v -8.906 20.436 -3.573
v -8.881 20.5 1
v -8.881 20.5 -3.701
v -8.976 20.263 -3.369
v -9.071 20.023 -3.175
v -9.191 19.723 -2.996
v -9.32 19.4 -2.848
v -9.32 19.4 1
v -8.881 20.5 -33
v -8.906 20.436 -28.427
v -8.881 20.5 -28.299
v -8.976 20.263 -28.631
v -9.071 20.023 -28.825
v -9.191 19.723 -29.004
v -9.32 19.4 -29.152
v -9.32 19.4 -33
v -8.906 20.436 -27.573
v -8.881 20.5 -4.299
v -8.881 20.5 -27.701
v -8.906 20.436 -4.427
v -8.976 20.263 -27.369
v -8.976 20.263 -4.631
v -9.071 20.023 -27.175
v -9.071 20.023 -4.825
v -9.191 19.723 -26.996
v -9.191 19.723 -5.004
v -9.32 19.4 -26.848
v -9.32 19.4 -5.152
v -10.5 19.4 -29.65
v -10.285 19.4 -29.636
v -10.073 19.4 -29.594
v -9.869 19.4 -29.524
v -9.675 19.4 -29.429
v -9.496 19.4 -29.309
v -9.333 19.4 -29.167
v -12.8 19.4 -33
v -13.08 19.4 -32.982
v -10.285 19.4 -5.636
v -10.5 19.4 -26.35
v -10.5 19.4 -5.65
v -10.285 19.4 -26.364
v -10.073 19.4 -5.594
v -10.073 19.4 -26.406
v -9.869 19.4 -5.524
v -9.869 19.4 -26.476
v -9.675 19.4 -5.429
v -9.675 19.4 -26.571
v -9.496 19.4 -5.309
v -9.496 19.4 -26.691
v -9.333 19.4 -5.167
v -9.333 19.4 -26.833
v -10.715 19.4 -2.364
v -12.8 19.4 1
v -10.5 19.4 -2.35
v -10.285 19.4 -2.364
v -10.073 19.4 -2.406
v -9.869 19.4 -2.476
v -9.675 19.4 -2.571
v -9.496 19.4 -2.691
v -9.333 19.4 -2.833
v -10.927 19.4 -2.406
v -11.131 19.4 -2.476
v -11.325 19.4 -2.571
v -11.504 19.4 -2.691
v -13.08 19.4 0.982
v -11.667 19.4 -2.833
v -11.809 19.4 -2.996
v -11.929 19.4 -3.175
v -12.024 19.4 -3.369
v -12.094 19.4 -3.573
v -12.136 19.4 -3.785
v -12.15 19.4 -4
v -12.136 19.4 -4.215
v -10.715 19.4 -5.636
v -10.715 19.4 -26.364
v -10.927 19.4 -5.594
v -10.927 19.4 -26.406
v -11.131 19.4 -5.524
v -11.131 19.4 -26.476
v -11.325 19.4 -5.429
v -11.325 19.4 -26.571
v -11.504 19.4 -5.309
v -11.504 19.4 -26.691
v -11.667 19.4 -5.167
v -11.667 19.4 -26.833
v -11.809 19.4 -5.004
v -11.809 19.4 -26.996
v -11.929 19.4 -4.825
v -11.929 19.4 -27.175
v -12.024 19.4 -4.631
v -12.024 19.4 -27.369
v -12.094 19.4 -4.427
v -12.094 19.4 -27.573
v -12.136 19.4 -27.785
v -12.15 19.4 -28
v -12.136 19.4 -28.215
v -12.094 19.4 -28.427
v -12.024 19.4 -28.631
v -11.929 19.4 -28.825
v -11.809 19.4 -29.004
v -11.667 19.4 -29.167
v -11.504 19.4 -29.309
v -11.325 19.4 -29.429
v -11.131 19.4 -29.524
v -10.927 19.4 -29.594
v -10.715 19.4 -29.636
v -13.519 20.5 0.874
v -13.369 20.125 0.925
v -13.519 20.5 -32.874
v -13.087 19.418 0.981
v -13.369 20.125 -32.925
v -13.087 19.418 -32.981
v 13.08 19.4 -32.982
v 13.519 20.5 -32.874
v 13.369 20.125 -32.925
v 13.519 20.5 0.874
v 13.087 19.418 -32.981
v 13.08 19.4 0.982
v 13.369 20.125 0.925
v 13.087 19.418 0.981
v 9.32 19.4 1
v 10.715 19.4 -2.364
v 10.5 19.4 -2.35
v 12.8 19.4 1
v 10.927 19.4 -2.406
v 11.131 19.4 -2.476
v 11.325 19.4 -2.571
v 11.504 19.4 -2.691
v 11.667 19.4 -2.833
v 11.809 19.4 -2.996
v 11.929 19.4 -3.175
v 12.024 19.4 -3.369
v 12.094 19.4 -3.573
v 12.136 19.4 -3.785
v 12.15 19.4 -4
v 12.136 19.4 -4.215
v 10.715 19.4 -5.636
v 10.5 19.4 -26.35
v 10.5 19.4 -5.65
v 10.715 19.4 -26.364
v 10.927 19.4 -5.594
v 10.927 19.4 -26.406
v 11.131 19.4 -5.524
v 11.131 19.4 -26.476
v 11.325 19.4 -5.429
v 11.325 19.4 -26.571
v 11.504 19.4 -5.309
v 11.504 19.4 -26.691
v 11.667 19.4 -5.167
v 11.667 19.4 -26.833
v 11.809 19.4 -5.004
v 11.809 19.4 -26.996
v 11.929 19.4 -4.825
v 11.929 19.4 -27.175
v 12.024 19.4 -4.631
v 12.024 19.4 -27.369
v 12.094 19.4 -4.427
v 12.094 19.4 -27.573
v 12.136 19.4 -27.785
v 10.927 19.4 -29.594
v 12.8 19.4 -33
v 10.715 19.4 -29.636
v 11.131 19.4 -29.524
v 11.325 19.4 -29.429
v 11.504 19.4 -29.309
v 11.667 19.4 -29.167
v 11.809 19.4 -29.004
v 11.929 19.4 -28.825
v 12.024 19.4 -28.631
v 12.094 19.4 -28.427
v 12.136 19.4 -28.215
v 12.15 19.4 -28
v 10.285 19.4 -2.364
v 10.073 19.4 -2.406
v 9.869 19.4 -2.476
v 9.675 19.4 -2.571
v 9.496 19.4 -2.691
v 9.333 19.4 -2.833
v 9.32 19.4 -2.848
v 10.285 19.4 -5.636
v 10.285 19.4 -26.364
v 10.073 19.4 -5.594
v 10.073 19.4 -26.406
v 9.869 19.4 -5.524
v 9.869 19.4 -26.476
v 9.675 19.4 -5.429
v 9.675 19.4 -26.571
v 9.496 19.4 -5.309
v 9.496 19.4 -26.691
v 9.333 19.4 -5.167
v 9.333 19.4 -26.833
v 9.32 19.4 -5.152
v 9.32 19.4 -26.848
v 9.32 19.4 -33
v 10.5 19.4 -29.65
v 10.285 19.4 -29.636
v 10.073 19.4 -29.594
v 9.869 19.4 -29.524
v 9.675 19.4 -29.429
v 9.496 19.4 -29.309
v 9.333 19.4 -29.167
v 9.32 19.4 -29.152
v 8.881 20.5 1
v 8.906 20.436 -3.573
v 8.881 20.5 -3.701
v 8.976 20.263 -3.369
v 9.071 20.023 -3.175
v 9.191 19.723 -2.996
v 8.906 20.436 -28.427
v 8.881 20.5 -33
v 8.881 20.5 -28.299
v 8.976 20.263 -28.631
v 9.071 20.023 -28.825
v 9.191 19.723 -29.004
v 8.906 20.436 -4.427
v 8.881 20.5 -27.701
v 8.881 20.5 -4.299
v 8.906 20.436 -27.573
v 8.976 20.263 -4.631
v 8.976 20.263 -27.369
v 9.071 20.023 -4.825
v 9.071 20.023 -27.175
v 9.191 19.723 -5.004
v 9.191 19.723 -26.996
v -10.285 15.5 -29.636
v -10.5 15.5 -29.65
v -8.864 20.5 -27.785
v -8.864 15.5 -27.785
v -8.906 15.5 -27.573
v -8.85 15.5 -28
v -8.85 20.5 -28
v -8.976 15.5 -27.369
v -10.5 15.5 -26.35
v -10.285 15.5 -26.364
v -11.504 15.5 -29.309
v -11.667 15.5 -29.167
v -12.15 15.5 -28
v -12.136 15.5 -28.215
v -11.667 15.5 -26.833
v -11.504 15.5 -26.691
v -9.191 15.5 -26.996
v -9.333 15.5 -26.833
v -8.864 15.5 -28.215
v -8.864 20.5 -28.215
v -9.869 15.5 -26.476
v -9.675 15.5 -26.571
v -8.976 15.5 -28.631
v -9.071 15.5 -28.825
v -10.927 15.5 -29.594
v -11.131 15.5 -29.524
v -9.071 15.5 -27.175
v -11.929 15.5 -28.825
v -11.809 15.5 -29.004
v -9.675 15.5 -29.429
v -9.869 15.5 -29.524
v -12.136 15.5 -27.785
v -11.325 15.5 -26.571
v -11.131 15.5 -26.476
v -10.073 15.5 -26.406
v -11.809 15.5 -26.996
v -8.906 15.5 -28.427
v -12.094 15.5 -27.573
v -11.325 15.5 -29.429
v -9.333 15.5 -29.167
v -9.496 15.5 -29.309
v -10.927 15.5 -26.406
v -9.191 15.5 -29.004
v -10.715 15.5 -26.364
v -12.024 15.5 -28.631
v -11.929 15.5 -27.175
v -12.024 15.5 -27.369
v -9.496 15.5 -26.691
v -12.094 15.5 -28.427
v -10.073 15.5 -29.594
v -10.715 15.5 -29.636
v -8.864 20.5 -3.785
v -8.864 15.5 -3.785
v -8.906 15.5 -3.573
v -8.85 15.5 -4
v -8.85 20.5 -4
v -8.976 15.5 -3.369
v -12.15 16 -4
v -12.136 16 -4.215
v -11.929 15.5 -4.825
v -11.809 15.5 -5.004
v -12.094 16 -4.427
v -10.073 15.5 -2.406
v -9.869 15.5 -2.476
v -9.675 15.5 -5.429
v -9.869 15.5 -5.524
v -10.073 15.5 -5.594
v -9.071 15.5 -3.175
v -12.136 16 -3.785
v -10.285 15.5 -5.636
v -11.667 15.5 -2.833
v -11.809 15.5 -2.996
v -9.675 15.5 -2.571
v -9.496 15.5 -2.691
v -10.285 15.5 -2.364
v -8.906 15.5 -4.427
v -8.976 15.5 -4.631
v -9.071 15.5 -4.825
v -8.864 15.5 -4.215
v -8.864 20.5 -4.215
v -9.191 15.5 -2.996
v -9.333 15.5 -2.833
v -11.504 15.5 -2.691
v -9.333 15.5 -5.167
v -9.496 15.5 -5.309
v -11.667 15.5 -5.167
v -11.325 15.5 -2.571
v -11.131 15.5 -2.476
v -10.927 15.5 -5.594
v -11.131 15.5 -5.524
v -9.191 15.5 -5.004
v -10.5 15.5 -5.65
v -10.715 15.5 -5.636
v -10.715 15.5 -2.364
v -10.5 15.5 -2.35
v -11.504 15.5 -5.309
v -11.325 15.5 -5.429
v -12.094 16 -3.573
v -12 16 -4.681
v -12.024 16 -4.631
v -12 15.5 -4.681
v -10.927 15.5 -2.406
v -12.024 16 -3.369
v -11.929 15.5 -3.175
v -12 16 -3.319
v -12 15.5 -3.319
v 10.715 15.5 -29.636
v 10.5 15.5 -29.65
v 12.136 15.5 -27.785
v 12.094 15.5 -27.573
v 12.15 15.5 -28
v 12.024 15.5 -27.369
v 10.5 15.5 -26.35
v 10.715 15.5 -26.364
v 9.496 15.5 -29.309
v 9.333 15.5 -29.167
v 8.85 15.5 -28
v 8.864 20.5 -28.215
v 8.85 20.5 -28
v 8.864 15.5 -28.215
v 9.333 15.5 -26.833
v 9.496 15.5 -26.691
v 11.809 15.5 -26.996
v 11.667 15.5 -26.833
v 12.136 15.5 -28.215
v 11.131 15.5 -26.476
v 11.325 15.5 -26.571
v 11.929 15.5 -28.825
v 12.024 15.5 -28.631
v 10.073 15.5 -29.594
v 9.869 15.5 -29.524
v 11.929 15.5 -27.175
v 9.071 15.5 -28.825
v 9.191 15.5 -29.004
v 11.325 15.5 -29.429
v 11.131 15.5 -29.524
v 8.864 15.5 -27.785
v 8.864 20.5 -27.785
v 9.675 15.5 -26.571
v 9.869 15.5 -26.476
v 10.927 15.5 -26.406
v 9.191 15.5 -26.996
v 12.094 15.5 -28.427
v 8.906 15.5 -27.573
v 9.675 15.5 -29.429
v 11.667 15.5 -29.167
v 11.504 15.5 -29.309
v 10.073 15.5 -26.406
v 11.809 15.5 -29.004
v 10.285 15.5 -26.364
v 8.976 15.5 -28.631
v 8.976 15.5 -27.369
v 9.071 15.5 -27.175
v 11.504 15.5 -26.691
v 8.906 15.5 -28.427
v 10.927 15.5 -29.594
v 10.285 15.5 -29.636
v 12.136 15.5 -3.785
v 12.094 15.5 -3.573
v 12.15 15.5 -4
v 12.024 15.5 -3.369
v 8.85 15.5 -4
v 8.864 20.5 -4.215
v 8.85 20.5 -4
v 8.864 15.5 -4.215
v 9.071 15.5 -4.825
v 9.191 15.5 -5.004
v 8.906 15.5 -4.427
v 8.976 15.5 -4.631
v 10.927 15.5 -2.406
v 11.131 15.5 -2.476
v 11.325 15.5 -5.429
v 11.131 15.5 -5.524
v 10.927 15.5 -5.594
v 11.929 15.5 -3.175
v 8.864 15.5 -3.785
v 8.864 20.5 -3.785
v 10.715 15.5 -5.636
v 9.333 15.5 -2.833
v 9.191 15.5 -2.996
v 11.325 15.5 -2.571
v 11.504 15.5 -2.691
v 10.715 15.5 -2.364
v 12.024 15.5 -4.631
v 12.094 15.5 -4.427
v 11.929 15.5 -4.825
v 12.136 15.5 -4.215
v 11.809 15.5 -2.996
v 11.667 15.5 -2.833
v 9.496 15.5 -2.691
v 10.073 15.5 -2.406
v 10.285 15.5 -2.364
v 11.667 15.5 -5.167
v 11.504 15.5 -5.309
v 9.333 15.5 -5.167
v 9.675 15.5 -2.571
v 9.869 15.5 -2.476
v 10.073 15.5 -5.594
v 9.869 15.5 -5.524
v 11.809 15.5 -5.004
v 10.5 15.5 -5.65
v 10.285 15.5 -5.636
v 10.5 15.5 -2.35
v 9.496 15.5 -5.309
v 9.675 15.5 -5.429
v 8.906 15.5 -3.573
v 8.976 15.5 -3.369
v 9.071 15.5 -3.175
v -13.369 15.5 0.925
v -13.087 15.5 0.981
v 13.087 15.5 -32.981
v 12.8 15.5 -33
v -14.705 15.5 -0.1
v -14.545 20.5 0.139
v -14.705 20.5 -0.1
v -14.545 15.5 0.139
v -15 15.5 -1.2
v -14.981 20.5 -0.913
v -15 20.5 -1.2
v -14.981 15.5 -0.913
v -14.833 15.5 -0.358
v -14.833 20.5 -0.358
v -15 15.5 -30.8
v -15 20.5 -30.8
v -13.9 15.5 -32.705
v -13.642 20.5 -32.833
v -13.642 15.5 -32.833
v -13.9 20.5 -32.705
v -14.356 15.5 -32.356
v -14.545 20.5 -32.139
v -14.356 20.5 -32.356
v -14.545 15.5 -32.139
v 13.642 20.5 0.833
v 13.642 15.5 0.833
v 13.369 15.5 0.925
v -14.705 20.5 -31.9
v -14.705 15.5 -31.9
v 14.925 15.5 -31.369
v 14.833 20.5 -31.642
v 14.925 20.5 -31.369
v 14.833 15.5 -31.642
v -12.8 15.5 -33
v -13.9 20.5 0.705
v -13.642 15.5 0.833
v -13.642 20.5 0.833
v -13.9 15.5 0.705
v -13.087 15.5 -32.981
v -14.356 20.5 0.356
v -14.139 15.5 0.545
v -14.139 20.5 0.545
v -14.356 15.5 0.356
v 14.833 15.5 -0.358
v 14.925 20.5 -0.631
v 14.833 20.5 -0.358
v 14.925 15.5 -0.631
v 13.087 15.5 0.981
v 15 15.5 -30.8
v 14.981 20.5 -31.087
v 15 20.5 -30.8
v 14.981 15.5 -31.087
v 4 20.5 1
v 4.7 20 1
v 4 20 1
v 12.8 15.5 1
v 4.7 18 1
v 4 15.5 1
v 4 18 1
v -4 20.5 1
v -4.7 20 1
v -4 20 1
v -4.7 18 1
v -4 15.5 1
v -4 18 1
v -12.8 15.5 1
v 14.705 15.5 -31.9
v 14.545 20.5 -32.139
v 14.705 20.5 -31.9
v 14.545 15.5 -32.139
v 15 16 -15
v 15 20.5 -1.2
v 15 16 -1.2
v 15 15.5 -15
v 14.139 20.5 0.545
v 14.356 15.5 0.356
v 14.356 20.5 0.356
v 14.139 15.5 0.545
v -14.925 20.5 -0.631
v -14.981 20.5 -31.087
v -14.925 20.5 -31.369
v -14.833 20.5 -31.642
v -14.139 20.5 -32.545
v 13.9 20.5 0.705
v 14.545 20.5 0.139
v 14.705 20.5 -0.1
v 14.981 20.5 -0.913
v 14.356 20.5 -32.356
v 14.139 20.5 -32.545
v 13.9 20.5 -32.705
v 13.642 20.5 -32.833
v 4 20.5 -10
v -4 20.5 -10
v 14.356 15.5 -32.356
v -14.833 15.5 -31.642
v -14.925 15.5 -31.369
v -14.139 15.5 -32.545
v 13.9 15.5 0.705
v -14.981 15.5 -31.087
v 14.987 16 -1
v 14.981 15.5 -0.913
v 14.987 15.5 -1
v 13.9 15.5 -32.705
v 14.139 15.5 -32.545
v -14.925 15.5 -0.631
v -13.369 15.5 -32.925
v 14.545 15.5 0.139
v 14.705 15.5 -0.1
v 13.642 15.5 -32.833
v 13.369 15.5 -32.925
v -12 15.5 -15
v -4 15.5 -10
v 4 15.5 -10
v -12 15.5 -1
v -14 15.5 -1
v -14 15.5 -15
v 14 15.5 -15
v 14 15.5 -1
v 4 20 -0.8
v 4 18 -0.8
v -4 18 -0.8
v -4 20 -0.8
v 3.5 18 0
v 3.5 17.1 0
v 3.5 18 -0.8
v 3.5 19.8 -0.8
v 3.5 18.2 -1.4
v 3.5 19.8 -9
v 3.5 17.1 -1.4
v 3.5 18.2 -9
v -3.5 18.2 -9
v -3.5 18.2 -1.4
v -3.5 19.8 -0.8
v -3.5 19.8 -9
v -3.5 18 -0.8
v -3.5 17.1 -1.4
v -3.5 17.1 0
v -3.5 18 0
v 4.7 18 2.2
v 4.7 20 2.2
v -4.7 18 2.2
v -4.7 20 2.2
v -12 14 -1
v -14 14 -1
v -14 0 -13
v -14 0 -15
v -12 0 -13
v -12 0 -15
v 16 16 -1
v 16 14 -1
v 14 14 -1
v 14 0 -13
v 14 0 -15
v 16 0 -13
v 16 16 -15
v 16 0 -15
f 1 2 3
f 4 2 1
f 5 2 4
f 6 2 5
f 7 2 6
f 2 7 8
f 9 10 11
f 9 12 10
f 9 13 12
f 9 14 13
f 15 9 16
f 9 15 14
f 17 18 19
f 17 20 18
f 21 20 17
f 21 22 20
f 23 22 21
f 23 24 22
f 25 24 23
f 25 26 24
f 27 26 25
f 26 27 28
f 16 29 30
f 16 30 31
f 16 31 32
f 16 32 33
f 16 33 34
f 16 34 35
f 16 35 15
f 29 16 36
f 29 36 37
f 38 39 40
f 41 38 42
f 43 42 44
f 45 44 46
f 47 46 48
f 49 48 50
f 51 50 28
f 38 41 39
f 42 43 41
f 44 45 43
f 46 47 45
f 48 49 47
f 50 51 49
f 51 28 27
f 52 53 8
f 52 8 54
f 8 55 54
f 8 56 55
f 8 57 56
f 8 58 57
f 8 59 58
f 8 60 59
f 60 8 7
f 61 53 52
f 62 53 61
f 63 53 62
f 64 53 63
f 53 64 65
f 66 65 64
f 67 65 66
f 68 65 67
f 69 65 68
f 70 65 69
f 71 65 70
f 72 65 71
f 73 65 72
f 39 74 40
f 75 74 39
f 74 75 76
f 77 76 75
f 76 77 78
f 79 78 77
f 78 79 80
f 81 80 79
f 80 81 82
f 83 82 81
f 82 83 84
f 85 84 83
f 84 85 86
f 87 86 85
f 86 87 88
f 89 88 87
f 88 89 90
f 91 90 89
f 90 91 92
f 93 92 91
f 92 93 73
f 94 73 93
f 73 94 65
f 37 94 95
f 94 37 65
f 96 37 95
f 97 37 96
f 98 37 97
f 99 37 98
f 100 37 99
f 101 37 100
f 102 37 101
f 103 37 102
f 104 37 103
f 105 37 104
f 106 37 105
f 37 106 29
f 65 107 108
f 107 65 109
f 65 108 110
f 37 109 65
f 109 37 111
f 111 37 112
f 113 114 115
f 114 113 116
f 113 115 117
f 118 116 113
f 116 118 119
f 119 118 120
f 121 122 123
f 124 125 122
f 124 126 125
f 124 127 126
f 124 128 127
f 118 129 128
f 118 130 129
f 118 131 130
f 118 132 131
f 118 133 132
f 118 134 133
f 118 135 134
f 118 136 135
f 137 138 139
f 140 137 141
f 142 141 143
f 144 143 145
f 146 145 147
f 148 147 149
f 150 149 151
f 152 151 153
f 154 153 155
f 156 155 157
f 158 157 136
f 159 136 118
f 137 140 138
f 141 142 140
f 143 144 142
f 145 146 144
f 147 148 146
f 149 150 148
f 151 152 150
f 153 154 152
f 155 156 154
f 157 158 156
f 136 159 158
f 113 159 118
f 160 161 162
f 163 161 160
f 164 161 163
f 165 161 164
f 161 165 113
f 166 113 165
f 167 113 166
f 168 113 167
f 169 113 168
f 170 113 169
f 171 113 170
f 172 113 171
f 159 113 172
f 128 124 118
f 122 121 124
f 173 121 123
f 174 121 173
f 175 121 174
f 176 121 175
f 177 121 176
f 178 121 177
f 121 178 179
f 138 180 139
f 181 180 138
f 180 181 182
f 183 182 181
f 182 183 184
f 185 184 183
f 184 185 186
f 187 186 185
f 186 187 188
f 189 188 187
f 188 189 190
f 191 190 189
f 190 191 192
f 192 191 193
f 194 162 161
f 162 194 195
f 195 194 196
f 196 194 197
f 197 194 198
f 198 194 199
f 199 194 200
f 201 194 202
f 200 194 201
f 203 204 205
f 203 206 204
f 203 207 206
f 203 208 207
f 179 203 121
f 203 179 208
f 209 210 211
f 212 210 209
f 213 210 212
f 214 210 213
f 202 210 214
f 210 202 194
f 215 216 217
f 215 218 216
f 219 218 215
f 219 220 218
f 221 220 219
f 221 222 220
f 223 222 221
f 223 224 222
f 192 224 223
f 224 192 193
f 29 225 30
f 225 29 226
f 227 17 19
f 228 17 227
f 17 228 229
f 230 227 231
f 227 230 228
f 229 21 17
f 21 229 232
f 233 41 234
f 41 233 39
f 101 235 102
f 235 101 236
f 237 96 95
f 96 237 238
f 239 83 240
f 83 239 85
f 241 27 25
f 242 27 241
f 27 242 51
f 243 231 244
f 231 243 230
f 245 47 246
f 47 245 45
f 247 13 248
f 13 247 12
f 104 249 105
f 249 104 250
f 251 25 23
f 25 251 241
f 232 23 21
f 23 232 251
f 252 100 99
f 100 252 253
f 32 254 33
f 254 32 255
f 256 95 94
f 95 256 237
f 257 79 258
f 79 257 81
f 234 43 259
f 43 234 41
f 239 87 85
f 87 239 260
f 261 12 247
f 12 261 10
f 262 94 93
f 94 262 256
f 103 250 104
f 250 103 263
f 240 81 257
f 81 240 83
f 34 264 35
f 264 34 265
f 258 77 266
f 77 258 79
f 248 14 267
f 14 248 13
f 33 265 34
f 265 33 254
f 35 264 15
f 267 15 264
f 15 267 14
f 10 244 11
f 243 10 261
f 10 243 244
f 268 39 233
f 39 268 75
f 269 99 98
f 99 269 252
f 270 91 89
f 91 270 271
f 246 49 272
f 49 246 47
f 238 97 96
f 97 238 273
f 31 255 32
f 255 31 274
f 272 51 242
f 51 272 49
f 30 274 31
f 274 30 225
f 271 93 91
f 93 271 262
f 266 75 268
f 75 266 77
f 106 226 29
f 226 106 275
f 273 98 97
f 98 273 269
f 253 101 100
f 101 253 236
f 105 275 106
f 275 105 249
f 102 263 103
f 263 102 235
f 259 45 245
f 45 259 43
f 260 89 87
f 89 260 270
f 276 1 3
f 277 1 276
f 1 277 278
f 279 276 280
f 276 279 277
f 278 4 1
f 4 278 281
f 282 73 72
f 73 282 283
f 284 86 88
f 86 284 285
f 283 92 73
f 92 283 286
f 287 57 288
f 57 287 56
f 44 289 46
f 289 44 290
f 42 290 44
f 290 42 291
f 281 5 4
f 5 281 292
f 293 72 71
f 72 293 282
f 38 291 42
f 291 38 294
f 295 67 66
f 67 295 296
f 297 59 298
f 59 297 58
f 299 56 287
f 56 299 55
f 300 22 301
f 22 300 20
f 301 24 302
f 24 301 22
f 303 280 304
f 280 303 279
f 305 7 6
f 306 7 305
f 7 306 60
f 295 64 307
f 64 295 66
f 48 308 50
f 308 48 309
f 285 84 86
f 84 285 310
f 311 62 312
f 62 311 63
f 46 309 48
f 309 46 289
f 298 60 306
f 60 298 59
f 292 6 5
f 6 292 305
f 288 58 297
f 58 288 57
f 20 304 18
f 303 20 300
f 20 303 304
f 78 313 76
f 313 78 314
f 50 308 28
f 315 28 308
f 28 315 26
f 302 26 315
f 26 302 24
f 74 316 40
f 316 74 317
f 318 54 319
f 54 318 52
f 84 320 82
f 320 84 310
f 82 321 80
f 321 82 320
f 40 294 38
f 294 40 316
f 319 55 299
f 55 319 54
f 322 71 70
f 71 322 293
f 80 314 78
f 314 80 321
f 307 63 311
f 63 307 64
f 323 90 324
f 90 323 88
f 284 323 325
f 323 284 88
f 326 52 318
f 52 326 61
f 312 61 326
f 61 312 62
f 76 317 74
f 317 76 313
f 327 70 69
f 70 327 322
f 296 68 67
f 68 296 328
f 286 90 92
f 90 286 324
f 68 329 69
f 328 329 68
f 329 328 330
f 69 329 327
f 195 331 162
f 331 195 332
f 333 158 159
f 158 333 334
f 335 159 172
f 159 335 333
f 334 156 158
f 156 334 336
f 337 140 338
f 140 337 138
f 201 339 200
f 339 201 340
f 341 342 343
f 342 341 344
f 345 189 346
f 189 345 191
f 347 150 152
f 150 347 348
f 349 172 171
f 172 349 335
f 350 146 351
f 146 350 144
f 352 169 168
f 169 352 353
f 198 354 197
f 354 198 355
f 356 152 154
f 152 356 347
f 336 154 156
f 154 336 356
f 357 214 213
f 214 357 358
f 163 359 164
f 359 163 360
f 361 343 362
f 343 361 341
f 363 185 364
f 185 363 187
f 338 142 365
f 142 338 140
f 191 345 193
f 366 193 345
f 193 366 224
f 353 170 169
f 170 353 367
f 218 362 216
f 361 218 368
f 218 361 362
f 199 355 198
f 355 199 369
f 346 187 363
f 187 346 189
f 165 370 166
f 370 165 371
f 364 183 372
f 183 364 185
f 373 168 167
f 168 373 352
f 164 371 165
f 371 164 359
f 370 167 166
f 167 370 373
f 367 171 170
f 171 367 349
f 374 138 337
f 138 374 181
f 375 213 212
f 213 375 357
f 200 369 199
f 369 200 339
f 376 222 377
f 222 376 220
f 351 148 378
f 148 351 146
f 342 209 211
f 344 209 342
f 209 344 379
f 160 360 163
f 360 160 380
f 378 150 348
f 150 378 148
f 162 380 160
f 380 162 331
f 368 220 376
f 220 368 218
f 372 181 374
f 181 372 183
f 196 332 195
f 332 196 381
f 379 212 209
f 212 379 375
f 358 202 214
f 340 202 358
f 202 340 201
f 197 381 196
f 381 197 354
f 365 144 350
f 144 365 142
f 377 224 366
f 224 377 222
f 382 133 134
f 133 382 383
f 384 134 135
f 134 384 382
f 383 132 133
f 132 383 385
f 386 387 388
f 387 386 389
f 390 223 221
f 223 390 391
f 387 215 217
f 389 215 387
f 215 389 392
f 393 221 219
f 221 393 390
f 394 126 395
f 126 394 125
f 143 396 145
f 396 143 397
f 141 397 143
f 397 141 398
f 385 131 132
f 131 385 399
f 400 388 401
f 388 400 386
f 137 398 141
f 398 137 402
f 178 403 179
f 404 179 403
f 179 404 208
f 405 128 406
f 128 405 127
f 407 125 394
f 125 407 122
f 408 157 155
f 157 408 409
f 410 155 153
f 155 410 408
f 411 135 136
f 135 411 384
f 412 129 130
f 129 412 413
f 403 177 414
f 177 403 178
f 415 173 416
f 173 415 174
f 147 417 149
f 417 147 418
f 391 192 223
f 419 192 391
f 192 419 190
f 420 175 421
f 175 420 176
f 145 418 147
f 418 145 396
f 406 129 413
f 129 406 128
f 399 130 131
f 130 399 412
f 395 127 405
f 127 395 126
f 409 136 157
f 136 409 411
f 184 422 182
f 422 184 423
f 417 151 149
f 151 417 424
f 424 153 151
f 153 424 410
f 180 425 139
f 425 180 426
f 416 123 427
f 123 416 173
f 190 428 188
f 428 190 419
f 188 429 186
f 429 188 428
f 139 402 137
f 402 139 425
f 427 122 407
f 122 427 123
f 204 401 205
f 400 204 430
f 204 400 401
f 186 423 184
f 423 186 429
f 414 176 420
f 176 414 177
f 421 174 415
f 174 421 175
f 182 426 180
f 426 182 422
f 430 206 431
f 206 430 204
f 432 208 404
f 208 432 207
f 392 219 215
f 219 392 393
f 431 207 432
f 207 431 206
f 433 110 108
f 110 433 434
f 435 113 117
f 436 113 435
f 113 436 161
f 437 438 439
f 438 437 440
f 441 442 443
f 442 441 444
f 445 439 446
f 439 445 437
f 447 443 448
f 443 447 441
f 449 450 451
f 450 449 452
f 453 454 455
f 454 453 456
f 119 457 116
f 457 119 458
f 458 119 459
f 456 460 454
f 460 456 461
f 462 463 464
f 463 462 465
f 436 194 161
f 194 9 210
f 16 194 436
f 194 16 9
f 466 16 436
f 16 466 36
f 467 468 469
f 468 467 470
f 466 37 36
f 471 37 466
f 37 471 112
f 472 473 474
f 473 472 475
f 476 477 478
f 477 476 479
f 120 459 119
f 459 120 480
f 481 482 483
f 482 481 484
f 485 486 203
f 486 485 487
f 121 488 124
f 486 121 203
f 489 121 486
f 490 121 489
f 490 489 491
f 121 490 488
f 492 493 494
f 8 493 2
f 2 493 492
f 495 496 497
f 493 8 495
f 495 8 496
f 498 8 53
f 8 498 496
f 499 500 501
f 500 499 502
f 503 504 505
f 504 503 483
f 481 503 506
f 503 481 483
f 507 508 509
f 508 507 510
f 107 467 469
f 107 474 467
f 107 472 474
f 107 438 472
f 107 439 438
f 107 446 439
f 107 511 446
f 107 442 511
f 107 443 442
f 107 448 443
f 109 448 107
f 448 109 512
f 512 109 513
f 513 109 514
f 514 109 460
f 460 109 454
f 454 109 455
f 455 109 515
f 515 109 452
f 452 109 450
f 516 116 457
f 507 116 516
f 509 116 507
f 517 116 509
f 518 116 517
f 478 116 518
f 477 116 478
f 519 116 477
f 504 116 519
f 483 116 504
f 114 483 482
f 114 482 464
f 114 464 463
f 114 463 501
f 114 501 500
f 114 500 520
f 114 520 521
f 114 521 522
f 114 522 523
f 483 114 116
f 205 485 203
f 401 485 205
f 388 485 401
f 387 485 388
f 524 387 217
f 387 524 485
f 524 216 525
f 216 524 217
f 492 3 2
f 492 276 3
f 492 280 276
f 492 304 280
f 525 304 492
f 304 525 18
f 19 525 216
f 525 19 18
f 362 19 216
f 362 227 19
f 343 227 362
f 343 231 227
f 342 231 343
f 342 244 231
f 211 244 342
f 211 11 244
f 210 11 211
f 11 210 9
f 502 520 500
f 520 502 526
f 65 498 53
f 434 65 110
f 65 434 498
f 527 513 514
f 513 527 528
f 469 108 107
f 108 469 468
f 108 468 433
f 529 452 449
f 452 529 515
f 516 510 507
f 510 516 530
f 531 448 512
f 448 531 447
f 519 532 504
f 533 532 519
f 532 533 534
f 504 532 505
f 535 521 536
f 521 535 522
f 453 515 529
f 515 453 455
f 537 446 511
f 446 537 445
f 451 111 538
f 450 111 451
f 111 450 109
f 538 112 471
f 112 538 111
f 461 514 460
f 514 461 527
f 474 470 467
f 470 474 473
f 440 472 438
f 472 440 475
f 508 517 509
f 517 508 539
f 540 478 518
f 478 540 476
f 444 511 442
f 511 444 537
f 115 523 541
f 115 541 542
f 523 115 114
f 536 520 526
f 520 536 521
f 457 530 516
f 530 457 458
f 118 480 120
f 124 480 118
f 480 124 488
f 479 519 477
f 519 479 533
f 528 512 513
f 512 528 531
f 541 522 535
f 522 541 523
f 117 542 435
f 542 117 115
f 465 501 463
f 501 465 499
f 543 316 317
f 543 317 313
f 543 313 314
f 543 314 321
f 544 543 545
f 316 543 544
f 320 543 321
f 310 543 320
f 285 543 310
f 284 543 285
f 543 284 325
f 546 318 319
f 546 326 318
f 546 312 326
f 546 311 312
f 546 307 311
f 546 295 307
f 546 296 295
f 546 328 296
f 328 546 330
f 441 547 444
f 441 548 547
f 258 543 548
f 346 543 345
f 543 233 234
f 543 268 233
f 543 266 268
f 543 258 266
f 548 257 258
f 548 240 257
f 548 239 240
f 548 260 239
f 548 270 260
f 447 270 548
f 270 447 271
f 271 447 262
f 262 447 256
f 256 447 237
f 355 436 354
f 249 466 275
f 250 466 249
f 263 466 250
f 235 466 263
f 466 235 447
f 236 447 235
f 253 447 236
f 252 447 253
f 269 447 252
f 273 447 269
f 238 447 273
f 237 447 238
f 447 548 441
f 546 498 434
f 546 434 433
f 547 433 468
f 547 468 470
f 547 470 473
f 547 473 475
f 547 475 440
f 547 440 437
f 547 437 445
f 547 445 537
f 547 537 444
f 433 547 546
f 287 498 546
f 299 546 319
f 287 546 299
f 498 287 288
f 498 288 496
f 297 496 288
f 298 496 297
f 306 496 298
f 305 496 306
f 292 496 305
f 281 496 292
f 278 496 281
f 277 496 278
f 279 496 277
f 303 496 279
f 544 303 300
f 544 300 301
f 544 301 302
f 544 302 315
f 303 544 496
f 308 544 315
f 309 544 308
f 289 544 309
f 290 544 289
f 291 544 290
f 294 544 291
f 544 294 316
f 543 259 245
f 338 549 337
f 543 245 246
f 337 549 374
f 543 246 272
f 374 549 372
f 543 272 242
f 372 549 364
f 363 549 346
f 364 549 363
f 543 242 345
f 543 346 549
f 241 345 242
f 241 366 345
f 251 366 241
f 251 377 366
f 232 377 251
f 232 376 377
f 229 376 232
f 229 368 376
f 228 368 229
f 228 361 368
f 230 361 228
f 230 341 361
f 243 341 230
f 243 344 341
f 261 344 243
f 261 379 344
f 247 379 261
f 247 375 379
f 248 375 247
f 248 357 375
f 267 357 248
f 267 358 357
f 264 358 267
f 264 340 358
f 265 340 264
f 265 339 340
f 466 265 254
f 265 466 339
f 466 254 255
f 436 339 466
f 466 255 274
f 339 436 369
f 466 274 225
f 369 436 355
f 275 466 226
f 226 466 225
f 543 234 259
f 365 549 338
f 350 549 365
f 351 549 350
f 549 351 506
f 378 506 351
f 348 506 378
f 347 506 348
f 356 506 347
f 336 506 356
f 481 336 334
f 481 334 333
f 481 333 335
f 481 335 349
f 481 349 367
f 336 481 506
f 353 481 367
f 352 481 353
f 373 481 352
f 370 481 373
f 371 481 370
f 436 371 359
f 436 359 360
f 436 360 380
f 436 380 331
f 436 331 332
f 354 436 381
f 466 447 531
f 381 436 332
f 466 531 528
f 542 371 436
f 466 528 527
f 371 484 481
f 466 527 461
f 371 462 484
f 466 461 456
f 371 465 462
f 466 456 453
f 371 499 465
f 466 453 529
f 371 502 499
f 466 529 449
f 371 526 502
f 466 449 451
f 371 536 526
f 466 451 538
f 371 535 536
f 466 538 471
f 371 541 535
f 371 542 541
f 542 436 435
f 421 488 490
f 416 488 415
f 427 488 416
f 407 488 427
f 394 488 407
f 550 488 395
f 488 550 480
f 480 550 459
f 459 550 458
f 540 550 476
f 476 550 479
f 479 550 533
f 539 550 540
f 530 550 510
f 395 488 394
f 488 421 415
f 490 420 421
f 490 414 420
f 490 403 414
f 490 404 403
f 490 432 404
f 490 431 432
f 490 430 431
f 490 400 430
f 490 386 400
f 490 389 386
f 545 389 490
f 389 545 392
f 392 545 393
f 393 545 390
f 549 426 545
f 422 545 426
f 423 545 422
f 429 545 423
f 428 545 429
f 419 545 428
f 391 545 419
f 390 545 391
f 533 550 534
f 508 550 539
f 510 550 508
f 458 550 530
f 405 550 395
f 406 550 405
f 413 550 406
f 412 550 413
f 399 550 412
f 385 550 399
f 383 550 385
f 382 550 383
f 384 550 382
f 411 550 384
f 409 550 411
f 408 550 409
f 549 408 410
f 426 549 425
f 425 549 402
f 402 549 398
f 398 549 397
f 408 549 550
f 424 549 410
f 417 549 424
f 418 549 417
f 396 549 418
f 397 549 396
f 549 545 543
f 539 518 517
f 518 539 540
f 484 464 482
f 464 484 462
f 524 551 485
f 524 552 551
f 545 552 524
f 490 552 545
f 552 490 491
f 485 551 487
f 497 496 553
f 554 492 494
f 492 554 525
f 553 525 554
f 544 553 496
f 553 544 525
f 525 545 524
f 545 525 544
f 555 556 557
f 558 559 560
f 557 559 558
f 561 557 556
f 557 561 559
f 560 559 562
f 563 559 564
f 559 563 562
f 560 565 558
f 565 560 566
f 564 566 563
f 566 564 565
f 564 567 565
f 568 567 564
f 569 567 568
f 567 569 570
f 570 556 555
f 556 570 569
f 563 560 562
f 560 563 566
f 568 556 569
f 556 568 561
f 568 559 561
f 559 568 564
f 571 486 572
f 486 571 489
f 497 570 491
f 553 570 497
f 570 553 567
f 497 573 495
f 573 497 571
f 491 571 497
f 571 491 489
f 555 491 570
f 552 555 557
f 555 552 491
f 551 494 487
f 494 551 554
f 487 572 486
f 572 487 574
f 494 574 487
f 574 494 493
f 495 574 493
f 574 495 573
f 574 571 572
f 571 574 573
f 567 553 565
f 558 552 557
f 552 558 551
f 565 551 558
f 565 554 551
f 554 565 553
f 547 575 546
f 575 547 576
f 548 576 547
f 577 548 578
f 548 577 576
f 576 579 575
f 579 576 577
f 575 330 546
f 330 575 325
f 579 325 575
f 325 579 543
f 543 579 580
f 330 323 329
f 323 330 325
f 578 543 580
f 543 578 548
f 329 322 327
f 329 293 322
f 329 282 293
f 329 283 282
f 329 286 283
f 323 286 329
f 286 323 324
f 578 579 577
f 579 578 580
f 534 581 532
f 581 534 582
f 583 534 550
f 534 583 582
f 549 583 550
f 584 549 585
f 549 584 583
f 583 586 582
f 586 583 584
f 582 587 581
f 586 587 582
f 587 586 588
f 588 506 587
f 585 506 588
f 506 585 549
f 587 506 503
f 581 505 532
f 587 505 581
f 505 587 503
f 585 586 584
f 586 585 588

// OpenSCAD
// file: rm_common.scad
// RobotMind Modular Ecosystem — common library
// Rev A concept for FDM prototyping, designed to migrate to injection molding.
$fn = 48;

// ---- Global mechanical interface ----
RM_DOCK_W = 30;
RM_DOCK_L = 34;
RM_DOCK_H = 5;
RM_RAIL_H = 2.6;
RM_RAIL_W = 3.2;
RM_RAIL_INSET = 3.8;
RM_CLEARANCE = 0.28;   // FDM sliding clearance per side
RM_LATCH_W = 7;
RM_LATCH_L = 9;
RM_LATCH_T = 1.6;
RM_LATCH_HOOK = 1.1;
RM_M3 = 3.3;

module rounded_box(size=[20,20,3], r=2, center=false) {
    x=size[0]; y=size[1]; z=size[2];
    translate(center ? [-x/2,-y/2,-z/2] : [0,0,0])
    linear_extrude(height=z)
      offset(r=r)
      offset(delta=-r)
      square([x,y]);
}

module slot2d(len=10, d=3) {
    hull(){
      translate([-len/2+d/2,0]) circle(d=d);
      translate([ len/2-d/2,0]) circle(d=d);
    }
}

// Male dovetail rail. The simplified trapezoid is robust in FDM and moldable.
module dovetail_rail(len=RM_DOCK_L-4, w=RM_RAIL_W, h=RM_RAIL_H) {
    linear_extrude(height=len)
      polygon(points=[[-w/2,0],[w/2,0],[w/2+1.0,h],[-w/2-1.0,h]]);
}

// Female channel cutter, slightly oversized.
module dovetail_channel(len=RM_DOCK_L, w=RM_RAIL_W+2*RM_CLEARANCE, h=RM_RAIL_H+RM_CLEARANCE) {
    linear_extrude(height=len)
      polygon(points=[[-w/2,0],[w/2,0],[w/2+1.15,h],[-w/2-1.15,h]]);
}

module male_interface() {
    // Interface origin centered X/Y, bottom at Z=0.
    for (sx=[-1,1])
      translate([sx*(RM_DOCK_W/2-RM_RAIL_INSET), -RM_DOCK_L/2+2, 0])
        rotate([-90,0,0]) dovetail_rail();
    // central catch boss engaged by dock latch
    translate([-RM_LATCH_W/2, RM_DOCK_L/2-7, 0])
      cube([RM_LATCH_W,4,1.25]);
}

module dock_body_base() {
    difference(){
      rounded_box([RM_DOCK_W,RM_DOCK_L,RM_DOCK_H],2.2,center=true);
      // open female dovetails from insertion side
      for (sx=[-1,1])
        translate([sx*(RM_DOCK_W/2-RM_RAIL_INSET), -RM_DOCK_L/2-0.2, -RM_DOCK_H/2+1.1])
          rotate([-90,0,0]) dovetail_channel(len=RM_DOCK_L+1);
      // four M3 mounting holes
      for(x=[-10.5,10.5], y=[-12,12]) translate([x,y,0]) cylinder(h=RM_DOCK_H+2,d=RM_M3,center=true);
      // latch relief window
      translate([-RM_LATCH_W/2-0.5, RM_DOCK_L/2-11, -RM_DOCK_H/2-0.1]) cube([RM_LATCH_W+1,11,RM_DOCK_H+1]);
    }
}

module latch_finger() {
    // flexible cantilever integrated at back of dock
    translate([-RM_LATCH_W/2, RM_DOCK_L/2-10, -RM_DOCK_H/2+0.7]) {
      cube([RM_LATCH_W,RM_LATCH_L,RM_LATCH_T]);
      translate([0,RM_LATCH_L-1.4,RM_LATCH_T]) cube([RM_LATCH_W,1.4,RM_LATCH_HOOK]);
      // thumb tab
      translate([-1.2,RM_LATCH_L-0.8,-0.2]) cube([RM_LATCH_W+2.4,3,RM_LATCH_T+0.4]);
    }
}

module universal_dock() {
    union(){ dock_body_base(); latch_finger(); }
}

module sensor_carrier(pcb=[20,20], wall=1.7, floor=1.8, clearance=0.5) {
    // carrier top tray centered; universal male interface below
    W=pcb[0]+2*(wall+clearance);
    L=pcb[1]+2*(wall+clearance);
    union(){
      translate([-W/2,-L/2,0]) difference(){
        rounded_box([W,L,floor+3.1],2);
        translate([wall,wall,floor]) rounded_box([pcb[0]+2*clearance,pcb[1]+2*clearance,5],1.0);
        // cable exit on front edge
        translate([W/2-6,-0.2,floor+0.5]) cube([12,wall+1,3.5]);
      }
      // small retention lips; gentle, printable snap
      for(x=[-W/2+2.2,W/2-2.2], y=[-L/2+2.2,L/2-2.2])
         translate([x,y,floor+2.5]) cylinder(h=1.3,d=2.2);
      translate([0,0,-RM_RAIL_H]) male_interface();
    }
}

module tag_insert(tag=[60,60], border=3.0, t=1.0, pulltab=true) {
    W=tag[0]+2*border; H=tag[1]+2*border;
    union(){
      translate([-W/2,-H/2,0]) rounded_box([W,H,t],1.2);
      if(pulltab) translate([-8,-H/2-4,0]) rounded_box([16,5,t],1.2);
    }
}

module tag_insert_rails(tag=[60,60], border=4, rail=1.5, depth=2.2) {
    W=tag[0]+2*border; H=tag[1]+2*border;
    // rails intended to capture tag insert edges
    for(sx=[-1,1]) translate([sx*(W/2-rail/2),0,0]) cube([rail,H,depth],center=true);
    translate([0,H/2-rail/2,0]) cube([W,rail,depth],center=true); // hard stop
}

module angle_wedge(angle=15, footprint=[RM_DOCK_W+4,RM_DOCK_L+4], min_h=3) {
    // solid wedge with top angled; child dock can be placed on top by caller
    W=footprint[0]; L=footprint[1]; dh=tan(angle)*L;
    polyhedron(points=[
      [-W/2,-L/2,0],[W/2,-L/2,0],[W/2,L/2,0],[-W/2,L/2,0],
      [-W/2,-L/2,min_h],[W/2,-L/2,min_h],[W/2,L/2,min_h+dh],[-W/2,L/2,min_h+dh]
    ], faces=[[0,1,2,3],[4,7,6,5],[0,4,5,1],[1,5,6,2],[2,6,7,3],[3,7,4,0]]);
}
// main file
include <rm_common.scad>
// 90-degree wall mount: plate + horizontal universal dock shelf.
union(){
  translate([-20,-2,-20]) rounded_box([40,4,40],2);
  translate([0,RM_DOCK_L/2+1,-16]) rotate([90,0,0]) universal_dock();
  // gussets
  for(x=[-14,14]) hull(){
    translate([x,0,-15]) cube([2,4,2]);
    translate([x,14,-15]) cube([2,2,14]);
  }
}
